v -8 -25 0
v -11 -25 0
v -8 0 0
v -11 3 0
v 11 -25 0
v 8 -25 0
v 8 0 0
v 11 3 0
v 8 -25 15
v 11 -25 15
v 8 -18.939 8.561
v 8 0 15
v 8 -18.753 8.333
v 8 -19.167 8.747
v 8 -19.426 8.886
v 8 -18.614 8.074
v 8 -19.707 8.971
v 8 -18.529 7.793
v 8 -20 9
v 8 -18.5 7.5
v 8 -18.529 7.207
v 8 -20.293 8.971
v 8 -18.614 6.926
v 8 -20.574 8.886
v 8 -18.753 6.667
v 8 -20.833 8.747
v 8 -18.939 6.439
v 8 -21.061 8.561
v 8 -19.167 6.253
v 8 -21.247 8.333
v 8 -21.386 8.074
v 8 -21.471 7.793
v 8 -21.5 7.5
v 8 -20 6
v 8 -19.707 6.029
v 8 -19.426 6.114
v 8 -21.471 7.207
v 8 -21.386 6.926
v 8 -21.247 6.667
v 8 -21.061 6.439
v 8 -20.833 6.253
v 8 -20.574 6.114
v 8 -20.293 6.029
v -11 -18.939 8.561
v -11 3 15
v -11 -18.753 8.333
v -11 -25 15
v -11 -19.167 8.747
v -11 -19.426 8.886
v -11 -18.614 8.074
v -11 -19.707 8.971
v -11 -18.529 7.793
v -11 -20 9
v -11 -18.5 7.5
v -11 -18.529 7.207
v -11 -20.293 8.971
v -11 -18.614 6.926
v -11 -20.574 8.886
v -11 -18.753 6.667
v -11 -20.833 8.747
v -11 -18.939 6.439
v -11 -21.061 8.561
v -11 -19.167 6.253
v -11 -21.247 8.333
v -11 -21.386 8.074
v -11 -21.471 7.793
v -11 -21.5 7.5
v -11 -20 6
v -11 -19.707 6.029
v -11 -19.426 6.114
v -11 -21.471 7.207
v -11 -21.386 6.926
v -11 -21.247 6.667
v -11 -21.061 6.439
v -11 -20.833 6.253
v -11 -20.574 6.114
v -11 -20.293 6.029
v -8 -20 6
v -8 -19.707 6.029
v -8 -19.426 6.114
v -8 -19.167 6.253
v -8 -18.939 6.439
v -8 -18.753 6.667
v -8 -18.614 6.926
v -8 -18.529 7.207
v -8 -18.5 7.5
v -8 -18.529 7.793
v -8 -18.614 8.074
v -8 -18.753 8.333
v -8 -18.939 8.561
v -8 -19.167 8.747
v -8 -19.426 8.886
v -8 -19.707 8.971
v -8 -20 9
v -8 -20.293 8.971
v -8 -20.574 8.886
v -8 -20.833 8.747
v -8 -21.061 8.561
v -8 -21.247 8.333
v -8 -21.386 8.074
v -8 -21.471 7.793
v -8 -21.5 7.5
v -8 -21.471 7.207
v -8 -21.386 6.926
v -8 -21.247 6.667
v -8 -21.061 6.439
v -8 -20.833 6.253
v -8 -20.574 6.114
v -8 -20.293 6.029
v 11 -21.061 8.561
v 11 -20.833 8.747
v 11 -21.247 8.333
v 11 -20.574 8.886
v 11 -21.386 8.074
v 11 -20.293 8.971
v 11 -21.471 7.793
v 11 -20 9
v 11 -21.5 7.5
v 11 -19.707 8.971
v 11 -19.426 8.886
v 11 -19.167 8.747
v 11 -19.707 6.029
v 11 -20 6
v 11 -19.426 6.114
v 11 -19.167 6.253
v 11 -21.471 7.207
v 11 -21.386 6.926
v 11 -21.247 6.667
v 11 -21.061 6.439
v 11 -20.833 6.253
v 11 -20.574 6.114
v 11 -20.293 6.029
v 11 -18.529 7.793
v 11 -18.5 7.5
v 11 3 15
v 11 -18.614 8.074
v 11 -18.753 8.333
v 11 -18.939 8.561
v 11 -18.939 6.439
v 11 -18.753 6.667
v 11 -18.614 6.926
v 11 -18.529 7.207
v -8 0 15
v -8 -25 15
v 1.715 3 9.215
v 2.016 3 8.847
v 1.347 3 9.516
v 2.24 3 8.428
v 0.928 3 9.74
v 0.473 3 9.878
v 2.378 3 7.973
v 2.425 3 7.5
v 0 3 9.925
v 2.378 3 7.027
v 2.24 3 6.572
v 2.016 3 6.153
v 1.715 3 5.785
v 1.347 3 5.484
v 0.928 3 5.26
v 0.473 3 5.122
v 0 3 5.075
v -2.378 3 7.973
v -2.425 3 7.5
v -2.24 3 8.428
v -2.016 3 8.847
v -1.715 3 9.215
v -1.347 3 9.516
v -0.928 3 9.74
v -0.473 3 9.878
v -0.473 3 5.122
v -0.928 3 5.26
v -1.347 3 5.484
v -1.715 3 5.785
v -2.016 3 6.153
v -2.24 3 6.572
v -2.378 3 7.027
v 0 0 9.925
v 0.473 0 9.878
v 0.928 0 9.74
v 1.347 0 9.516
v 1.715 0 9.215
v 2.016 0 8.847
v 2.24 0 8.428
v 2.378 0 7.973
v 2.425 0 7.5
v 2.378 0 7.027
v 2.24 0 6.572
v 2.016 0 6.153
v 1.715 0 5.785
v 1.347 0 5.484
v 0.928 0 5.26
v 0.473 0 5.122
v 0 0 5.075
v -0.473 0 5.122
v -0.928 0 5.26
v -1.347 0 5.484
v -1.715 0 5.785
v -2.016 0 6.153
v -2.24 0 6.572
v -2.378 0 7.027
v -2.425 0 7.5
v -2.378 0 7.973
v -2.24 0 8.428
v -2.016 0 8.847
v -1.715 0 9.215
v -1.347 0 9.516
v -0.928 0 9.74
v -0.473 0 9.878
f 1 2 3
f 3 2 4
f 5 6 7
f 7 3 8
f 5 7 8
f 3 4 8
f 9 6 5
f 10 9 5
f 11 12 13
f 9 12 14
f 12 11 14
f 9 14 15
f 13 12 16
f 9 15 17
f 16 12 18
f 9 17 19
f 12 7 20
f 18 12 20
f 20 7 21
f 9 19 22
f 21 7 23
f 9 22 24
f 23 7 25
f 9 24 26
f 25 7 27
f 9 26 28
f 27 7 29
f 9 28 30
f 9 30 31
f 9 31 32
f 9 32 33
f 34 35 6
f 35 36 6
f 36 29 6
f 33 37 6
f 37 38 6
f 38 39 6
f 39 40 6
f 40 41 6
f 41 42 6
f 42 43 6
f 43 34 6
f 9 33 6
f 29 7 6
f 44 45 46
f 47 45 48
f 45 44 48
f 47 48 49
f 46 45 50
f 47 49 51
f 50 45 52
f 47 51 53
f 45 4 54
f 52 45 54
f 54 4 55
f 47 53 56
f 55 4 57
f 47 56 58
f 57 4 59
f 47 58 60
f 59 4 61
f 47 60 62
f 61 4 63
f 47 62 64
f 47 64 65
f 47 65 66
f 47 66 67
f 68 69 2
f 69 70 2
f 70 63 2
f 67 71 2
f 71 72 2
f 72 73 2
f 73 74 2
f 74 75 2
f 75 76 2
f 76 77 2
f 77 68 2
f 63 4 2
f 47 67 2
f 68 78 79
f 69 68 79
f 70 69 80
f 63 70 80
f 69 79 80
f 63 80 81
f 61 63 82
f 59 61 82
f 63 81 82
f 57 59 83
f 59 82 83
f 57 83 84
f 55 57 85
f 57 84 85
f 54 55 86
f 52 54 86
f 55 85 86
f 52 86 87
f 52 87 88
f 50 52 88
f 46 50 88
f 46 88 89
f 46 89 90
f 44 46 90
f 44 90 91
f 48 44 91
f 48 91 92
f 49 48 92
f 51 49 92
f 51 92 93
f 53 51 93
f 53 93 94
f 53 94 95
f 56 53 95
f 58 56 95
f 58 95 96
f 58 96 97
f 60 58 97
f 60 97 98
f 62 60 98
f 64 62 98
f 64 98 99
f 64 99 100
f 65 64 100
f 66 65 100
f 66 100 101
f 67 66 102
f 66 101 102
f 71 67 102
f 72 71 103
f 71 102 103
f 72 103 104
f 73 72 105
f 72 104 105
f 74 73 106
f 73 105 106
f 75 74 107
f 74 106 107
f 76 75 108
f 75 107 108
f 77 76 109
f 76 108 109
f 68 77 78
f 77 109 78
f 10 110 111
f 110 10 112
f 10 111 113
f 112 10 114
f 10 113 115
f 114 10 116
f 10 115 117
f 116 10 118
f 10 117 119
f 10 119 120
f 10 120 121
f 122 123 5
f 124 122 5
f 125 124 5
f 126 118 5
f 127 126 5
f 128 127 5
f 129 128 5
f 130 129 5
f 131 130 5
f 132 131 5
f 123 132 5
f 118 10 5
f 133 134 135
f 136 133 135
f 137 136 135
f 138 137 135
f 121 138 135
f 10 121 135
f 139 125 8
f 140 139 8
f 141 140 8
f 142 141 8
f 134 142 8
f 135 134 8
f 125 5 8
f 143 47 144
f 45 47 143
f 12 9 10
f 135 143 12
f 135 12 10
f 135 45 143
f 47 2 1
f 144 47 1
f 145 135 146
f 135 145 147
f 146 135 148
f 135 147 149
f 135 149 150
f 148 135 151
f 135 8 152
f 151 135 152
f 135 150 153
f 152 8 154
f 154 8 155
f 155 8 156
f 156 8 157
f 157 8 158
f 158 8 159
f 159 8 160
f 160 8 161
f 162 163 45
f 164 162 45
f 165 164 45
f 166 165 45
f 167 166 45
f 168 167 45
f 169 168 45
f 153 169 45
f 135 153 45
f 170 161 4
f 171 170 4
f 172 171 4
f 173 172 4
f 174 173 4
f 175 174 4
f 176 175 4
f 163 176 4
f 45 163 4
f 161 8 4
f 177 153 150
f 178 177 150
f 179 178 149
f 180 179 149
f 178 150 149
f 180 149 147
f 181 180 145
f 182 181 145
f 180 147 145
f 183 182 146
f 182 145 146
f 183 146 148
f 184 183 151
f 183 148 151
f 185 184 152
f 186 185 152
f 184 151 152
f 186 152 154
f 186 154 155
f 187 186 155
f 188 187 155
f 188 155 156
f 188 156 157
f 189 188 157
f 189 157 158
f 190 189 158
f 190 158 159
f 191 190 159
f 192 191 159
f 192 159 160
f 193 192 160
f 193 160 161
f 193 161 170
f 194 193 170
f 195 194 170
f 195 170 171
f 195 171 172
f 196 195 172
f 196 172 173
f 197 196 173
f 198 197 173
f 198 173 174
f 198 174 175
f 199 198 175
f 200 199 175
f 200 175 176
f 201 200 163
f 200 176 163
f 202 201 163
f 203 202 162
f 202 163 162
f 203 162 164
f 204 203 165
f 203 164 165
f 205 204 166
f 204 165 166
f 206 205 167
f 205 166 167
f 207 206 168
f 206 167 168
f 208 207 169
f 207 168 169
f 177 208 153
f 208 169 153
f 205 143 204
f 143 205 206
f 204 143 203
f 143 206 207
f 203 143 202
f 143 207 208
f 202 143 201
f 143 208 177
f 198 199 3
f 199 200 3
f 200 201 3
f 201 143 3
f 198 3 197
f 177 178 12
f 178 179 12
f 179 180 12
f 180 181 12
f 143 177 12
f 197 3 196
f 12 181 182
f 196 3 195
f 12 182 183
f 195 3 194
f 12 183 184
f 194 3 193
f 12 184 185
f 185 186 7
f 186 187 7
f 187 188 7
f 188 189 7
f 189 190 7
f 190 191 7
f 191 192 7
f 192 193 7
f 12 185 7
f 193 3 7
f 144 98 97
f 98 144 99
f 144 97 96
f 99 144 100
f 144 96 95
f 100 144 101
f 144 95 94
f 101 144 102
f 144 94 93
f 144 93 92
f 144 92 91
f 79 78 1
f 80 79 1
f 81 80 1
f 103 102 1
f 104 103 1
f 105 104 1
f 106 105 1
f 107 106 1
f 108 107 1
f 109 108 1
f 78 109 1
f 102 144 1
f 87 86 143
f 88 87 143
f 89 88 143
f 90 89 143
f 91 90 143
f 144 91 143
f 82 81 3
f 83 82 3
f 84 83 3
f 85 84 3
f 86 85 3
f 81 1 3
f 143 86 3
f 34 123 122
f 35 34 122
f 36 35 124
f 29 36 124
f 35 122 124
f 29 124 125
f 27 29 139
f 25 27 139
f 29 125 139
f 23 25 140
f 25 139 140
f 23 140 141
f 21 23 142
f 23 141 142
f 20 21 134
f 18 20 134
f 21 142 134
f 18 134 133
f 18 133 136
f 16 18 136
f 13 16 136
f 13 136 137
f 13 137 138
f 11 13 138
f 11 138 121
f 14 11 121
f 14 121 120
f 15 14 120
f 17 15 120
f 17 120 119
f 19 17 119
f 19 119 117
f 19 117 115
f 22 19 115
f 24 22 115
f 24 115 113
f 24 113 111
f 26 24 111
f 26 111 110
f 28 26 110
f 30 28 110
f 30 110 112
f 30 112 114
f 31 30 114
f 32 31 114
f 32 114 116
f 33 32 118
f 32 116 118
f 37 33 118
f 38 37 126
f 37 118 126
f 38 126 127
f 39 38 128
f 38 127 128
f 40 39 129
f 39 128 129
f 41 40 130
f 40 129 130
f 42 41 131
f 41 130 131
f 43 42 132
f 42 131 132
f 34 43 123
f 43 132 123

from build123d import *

# Parameters (mm, degrees)
EXTRUDE_1_DEPTH     = 15
SKETCH_2_R          = 1.5
CUT_EXTRUDE_1_DEPTH = 37.523964735
SKETCH_3_R          = 2.425
CUT_EXTRUDE_2_DEPTH = 34.615472628


with BuildPart() as part:
    # 草图1 → 凸台-拉伸1 (new body)
    with BuildSketch(Plane.XY):
        Polygon((0, 0), (8, 0), (8, -25), (11, -25), (11, 3), (0, 3), (-11, 3), (-11, -25), (-8, -25), (-8, 0), align=None)
    extrude(amount=EXTRUDE_1_DEPTH)

    # 草图2 → 切除-拉伸1 (cut, through all)
    with BuildSketch(Plane(origin=(11, 0, 0), x_dir=(0, 0, -1), z_dir=(1, 0, 0))):
        with Locations((-7.5, -20)):
            Circle(SKETCH_2_R)
    extrude(amount=-CUT_EXTRUDE_1_DEPTH, mode=Mode.SUBTRACT)

    # 草图3 → 切除-拉伸2 (cut, through all)
    with BuildSketch(Plane(origin=(0, 3, 0), x_dir=(1, 0, 0), z_dir=(0, 1, 0))):
        with Locations(Location((0, -7.5, 0), (0, 0, 270))):
            Circle(SKETCH_3_R)
    extrude(amount=-CUT_EXTRUDE_2_DEPTH, mode=Mode.SUBTRACT)


solid = part.part
